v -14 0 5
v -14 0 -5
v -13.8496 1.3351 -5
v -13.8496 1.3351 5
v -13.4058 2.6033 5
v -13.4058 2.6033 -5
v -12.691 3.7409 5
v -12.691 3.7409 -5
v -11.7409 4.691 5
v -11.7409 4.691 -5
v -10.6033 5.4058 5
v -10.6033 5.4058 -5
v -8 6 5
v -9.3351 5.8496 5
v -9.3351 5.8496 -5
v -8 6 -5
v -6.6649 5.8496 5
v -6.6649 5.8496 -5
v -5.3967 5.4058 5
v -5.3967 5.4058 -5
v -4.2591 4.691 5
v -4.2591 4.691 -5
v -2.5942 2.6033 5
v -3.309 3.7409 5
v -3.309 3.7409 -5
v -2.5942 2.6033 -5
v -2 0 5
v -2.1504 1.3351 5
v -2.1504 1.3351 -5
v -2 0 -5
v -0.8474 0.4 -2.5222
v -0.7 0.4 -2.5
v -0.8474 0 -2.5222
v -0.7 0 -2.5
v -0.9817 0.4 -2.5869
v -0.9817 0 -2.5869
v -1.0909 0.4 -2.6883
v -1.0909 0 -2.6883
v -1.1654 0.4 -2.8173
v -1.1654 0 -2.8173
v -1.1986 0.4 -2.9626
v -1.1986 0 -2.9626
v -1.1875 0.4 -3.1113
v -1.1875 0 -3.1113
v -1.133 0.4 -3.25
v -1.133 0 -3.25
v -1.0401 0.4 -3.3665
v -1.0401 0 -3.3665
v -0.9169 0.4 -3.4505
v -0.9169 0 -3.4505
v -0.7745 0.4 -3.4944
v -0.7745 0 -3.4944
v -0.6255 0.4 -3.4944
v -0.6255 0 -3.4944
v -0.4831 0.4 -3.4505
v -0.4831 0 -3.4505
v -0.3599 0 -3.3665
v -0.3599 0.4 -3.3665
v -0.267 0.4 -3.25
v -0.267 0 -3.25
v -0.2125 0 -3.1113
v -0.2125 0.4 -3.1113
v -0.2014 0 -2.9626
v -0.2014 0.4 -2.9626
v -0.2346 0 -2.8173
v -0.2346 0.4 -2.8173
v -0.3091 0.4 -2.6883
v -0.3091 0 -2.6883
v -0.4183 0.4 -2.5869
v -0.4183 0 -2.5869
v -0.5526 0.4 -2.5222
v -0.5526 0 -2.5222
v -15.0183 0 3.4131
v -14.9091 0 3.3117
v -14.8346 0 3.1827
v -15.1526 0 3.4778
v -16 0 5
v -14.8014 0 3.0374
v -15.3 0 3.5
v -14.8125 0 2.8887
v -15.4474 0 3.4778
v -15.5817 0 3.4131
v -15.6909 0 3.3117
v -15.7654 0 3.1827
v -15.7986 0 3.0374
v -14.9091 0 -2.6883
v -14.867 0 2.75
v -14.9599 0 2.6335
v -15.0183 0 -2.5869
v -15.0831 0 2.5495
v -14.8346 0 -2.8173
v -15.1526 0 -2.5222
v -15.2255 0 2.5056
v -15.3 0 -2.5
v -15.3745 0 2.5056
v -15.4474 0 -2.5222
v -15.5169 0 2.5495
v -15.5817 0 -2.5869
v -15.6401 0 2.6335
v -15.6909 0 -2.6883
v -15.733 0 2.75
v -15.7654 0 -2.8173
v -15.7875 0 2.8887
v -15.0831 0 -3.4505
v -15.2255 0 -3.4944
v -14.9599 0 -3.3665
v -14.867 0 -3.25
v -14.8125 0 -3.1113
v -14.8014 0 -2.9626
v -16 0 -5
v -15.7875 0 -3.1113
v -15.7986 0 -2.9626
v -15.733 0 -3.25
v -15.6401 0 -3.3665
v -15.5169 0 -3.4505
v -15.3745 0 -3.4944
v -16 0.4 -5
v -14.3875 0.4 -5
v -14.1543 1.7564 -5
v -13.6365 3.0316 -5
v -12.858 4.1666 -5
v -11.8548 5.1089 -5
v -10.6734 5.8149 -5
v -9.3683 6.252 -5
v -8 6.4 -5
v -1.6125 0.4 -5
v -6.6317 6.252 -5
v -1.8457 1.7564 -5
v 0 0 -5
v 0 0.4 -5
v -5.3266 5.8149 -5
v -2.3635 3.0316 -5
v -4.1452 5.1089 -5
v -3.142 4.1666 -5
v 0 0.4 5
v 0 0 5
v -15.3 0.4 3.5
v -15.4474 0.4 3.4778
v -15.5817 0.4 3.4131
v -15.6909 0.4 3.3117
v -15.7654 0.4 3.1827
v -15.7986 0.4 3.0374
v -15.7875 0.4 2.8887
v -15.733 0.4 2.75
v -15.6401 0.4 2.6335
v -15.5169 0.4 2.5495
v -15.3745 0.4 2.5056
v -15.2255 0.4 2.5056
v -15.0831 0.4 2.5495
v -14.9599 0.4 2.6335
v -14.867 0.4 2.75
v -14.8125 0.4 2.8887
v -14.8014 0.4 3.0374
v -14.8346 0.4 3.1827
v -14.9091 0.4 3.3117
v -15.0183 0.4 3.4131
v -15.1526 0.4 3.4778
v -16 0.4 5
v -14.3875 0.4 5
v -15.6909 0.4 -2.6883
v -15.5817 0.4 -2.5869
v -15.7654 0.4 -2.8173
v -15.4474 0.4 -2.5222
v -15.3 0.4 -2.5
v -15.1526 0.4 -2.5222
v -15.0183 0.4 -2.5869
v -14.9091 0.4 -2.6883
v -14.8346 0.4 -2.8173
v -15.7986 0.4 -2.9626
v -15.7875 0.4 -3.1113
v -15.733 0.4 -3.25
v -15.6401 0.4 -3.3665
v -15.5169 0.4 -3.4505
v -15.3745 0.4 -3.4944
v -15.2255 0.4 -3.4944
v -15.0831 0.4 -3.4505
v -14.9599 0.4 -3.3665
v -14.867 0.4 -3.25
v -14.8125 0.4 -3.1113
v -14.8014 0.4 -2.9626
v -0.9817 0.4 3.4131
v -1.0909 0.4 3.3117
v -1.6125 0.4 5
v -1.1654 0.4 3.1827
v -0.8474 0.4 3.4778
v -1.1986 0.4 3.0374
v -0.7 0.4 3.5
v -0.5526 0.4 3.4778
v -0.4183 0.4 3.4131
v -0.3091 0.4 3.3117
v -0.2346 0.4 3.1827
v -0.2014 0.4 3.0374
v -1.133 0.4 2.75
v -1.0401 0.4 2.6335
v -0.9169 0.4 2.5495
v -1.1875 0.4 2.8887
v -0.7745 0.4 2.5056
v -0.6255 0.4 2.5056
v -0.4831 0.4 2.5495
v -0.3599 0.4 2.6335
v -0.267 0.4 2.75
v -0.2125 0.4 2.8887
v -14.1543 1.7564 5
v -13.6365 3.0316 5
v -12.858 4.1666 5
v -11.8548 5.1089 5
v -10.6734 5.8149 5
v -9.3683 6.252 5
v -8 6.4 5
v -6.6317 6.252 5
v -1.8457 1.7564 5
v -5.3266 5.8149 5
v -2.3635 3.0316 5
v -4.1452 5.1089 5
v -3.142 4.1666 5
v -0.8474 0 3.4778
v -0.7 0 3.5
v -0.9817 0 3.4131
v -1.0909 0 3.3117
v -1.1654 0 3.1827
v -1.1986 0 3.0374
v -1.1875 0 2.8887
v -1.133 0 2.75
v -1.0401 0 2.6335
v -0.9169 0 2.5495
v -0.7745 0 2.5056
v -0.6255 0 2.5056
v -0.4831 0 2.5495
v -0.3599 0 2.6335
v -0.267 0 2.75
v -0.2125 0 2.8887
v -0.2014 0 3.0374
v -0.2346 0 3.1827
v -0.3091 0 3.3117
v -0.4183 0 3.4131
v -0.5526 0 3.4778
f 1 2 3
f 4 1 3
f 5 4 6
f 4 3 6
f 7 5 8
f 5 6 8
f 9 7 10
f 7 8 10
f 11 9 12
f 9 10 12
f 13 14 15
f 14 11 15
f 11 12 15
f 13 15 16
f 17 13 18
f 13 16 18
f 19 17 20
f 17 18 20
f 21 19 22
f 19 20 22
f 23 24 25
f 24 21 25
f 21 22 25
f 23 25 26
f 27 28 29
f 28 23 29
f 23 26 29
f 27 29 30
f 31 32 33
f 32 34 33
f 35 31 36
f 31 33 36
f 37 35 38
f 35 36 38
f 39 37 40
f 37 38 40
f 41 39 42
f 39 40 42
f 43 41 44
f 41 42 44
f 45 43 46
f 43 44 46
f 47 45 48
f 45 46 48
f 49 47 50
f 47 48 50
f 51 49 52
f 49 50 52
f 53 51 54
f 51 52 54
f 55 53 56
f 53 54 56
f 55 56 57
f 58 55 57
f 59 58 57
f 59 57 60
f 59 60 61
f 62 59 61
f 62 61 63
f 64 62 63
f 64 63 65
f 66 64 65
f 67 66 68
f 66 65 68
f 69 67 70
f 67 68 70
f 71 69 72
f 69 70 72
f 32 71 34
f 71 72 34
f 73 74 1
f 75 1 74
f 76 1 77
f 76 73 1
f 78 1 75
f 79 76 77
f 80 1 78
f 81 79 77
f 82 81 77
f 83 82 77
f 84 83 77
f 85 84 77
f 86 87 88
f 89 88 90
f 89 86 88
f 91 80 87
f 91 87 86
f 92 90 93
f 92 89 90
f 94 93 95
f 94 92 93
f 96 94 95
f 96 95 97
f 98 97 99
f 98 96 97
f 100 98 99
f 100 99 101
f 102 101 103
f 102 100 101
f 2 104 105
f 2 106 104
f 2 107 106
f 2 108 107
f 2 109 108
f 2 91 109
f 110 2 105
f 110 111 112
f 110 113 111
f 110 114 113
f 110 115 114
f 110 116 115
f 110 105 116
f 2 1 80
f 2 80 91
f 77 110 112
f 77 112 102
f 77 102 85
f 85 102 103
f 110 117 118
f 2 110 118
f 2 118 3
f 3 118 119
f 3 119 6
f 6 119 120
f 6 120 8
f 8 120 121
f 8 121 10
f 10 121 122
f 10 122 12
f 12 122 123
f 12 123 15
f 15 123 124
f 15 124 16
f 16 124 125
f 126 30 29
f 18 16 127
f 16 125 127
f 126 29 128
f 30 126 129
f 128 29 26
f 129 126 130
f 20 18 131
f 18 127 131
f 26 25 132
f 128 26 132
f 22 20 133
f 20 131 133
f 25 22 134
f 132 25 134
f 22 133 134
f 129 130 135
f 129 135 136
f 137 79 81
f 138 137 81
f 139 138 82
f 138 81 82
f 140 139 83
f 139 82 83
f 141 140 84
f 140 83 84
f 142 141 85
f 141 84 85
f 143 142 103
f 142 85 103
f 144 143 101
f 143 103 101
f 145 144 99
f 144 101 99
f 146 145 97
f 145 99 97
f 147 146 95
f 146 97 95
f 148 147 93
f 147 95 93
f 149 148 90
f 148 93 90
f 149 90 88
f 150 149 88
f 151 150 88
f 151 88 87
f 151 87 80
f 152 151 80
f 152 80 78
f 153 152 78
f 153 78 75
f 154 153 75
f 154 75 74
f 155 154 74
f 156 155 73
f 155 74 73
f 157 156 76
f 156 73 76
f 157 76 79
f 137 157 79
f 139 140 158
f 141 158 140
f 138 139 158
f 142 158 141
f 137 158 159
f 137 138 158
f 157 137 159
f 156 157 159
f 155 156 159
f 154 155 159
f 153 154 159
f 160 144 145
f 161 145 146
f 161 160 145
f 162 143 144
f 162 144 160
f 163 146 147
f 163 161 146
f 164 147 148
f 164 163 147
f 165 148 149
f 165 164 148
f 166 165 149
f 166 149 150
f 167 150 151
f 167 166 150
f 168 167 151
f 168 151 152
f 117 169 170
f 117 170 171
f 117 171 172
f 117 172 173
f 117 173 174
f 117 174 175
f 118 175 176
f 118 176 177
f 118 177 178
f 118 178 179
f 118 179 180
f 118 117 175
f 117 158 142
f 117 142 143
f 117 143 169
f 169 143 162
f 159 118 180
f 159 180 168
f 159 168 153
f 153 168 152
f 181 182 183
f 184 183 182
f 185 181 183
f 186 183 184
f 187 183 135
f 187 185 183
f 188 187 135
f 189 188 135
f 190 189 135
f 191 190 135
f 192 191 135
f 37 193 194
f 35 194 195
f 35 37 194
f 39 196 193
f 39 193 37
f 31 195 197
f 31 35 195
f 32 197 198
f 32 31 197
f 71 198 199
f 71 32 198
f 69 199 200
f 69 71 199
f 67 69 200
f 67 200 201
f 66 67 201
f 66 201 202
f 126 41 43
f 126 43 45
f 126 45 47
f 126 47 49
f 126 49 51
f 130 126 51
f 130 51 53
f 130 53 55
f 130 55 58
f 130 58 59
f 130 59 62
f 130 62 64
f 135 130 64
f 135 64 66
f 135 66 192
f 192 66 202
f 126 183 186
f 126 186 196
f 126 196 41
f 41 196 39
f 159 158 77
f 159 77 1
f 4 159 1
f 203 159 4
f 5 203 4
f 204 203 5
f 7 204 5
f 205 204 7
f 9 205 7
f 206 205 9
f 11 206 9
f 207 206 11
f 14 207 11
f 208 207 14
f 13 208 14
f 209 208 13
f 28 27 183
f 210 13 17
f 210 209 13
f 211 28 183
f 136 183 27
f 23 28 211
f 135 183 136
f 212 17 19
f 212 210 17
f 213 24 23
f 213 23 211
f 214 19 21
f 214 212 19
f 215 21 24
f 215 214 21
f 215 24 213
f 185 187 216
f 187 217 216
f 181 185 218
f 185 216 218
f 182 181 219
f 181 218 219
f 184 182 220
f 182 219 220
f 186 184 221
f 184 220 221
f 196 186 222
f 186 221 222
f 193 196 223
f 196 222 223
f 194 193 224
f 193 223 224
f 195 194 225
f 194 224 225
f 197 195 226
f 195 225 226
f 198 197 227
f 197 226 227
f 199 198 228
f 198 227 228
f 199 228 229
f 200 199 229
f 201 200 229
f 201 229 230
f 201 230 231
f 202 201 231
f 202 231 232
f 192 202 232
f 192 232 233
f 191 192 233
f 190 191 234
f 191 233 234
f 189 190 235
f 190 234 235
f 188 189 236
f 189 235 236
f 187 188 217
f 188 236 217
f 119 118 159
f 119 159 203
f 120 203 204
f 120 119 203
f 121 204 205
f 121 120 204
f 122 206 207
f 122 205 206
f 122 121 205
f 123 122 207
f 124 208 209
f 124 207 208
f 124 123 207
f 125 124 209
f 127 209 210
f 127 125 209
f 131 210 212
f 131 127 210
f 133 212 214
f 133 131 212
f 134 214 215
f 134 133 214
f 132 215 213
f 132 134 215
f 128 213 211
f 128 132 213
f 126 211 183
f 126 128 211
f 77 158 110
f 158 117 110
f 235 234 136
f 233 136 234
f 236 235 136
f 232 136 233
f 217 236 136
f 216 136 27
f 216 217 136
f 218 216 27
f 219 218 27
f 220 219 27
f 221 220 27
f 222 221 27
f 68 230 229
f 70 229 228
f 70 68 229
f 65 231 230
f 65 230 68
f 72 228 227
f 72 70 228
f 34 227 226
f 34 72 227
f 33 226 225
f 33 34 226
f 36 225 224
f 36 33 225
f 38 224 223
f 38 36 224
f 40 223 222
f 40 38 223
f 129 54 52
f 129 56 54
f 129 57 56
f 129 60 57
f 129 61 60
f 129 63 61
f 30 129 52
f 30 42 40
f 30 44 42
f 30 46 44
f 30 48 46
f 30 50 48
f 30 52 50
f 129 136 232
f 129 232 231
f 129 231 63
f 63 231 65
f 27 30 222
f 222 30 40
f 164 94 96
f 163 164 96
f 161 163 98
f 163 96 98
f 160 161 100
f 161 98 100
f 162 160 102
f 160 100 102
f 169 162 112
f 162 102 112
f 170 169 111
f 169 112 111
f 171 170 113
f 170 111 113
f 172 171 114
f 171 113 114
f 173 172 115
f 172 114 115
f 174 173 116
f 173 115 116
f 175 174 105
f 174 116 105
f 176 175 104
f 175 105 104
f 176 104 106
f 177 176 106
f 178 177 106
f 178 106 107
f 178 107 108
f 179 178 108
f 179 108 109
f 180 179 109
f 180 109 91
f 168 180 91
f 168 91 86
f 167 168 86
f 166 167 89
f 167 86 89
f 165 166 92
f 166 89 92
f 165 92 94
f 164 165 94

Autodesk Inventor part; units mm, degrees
ref_plane "YZ Plane" through (0, 0, 0) normal (1, 0, 0) x (0, 1, 0)
ref_plane "XZ Plane" through (0, 0, 0) normal (0, 1, 0) x (-1, 0, 0)
ref_plane "XY Plane" through (0, 0, 0) normal (0, 0, 1) x (1, 0, 0)
sketch "Esboço1" plane through (0, 0, 0) normal (0, 0, 1) x (1, 0, 0)
  line L0 (0, 0) -> (-2, 0)
  arc A0 (-2, 0) -> (-14, 0) centre (-8, 0) ccw
  line L1 (-14, 0) -> (-16, 0)
  line L2 (-16, 0.4) -> (-14.3875, 0.4)
  arc A1 (-1.6125, 0.4) -> (-14.3875, 0.4) centre (-8, 0) ccw
  line L3 (-1.6125, 0.4) -> (0, 0.4)
  line L4 (0, 0.4) -> (0, 0)
  line L5 (-16, 0.4) -> (-16, 0)
  dimension "d2" = 2
  dimension "d3" = 12
  dimension "d4" = 6
  dimension "d5" = 2
  dimension "d6" = 6.4
extrude "Extrusão1" add sketch "Esboço1" along normal mid plane 10
sketch "Esboço4" plane through (-1.6125, 0.4, 5) normal (0, 1, 0) x (1, 0, 0)
  line L0 (1.6125, 10) -> (1.6125, 0) projected
  line L1 (1.6125, 0) -> (0, 0) projected
  line L2 (0, 10) -> (1.6125, 10) projected
  point P0 (1.6125, 5)
  point P1 (0.9125, 2)
  point P2 (0.9125, 8)
  point P3 (0.8063, 0)
  dimension "d13" = 0.7
  dimension "d14" = 0.7
  dimension "d15" = 2
  dimension "d16" = 2
hole "Furo1" at (-0.7, 0.4, 3) at (-0.7, 0.4, -3) direction (0, -1, 0) diameter 0.5 end through all counterbore diameter 1 counterbore depth 1
sketch "Esboço5" plane through (-16, 0.4, 5) normal (0, 1, 0) x (1, 0, 0)
  line L0 (0, 10) -> (0, 0) projected
  line L1 (0, 10) -> (1.6125, 10) projected
  line L2 (1.6125, 0) -> (0, 0) projected
  point P0 (16, 5)
  point P1 (0.7, 8)
  point P2 (0.7, 2)
  dimension "d24" = 0.7
  dimension "d25" = 2
  dimension "d26" = 2
  dimension "d27" = 0.7
hole "Furo2" at (-15.3, 0.4, -3) at (-15.3, 0.4, 3) direction (0, -1, 0) diameter 0.5 end through all counterbore diameter 1 counterbore depth 1
thread "Rosca1" size "M1x0.25" class "6H" standard "ANSI Metric M Profile" length 150
thread "Rosca2" size "M1x0.25" class "6H" standard "ANSI Metric M Profile" full length
thread "Rosca3" size "M1x0.25" class "6H" standard "ANSI Metric M Profile" full length
thread "Rosca4" size "M1x0.25" class "6H" standard "ANSI Metric M Profile" full length
thread "Rosca5" size "M1x0.25" class "6H" standard "ANSI Metric M Profile" full length
equation "\"Raio_vergadura\" = Espessura"
equation "\"Largura_alívio_de_vergadura\" = Espessura"
equation "\"Profundidade_alívio_de_vergadura\" = 0.5 * Espessura"
equation "\"Tamanho_alívio_de_dobra\" = 4 * Espessura"
equation "\"Remanescente_mínimo\" = 2 * Espessura"
equation "\"Raiodetransição\" = Raio_vergadura"
equation "\"Tamanho_de_raio_de_Jacobi\" = Raio_vergadura"
equation "\"TamanhoFolga\" = Espessura"
equation "\"Espessura\" = 0.5"
